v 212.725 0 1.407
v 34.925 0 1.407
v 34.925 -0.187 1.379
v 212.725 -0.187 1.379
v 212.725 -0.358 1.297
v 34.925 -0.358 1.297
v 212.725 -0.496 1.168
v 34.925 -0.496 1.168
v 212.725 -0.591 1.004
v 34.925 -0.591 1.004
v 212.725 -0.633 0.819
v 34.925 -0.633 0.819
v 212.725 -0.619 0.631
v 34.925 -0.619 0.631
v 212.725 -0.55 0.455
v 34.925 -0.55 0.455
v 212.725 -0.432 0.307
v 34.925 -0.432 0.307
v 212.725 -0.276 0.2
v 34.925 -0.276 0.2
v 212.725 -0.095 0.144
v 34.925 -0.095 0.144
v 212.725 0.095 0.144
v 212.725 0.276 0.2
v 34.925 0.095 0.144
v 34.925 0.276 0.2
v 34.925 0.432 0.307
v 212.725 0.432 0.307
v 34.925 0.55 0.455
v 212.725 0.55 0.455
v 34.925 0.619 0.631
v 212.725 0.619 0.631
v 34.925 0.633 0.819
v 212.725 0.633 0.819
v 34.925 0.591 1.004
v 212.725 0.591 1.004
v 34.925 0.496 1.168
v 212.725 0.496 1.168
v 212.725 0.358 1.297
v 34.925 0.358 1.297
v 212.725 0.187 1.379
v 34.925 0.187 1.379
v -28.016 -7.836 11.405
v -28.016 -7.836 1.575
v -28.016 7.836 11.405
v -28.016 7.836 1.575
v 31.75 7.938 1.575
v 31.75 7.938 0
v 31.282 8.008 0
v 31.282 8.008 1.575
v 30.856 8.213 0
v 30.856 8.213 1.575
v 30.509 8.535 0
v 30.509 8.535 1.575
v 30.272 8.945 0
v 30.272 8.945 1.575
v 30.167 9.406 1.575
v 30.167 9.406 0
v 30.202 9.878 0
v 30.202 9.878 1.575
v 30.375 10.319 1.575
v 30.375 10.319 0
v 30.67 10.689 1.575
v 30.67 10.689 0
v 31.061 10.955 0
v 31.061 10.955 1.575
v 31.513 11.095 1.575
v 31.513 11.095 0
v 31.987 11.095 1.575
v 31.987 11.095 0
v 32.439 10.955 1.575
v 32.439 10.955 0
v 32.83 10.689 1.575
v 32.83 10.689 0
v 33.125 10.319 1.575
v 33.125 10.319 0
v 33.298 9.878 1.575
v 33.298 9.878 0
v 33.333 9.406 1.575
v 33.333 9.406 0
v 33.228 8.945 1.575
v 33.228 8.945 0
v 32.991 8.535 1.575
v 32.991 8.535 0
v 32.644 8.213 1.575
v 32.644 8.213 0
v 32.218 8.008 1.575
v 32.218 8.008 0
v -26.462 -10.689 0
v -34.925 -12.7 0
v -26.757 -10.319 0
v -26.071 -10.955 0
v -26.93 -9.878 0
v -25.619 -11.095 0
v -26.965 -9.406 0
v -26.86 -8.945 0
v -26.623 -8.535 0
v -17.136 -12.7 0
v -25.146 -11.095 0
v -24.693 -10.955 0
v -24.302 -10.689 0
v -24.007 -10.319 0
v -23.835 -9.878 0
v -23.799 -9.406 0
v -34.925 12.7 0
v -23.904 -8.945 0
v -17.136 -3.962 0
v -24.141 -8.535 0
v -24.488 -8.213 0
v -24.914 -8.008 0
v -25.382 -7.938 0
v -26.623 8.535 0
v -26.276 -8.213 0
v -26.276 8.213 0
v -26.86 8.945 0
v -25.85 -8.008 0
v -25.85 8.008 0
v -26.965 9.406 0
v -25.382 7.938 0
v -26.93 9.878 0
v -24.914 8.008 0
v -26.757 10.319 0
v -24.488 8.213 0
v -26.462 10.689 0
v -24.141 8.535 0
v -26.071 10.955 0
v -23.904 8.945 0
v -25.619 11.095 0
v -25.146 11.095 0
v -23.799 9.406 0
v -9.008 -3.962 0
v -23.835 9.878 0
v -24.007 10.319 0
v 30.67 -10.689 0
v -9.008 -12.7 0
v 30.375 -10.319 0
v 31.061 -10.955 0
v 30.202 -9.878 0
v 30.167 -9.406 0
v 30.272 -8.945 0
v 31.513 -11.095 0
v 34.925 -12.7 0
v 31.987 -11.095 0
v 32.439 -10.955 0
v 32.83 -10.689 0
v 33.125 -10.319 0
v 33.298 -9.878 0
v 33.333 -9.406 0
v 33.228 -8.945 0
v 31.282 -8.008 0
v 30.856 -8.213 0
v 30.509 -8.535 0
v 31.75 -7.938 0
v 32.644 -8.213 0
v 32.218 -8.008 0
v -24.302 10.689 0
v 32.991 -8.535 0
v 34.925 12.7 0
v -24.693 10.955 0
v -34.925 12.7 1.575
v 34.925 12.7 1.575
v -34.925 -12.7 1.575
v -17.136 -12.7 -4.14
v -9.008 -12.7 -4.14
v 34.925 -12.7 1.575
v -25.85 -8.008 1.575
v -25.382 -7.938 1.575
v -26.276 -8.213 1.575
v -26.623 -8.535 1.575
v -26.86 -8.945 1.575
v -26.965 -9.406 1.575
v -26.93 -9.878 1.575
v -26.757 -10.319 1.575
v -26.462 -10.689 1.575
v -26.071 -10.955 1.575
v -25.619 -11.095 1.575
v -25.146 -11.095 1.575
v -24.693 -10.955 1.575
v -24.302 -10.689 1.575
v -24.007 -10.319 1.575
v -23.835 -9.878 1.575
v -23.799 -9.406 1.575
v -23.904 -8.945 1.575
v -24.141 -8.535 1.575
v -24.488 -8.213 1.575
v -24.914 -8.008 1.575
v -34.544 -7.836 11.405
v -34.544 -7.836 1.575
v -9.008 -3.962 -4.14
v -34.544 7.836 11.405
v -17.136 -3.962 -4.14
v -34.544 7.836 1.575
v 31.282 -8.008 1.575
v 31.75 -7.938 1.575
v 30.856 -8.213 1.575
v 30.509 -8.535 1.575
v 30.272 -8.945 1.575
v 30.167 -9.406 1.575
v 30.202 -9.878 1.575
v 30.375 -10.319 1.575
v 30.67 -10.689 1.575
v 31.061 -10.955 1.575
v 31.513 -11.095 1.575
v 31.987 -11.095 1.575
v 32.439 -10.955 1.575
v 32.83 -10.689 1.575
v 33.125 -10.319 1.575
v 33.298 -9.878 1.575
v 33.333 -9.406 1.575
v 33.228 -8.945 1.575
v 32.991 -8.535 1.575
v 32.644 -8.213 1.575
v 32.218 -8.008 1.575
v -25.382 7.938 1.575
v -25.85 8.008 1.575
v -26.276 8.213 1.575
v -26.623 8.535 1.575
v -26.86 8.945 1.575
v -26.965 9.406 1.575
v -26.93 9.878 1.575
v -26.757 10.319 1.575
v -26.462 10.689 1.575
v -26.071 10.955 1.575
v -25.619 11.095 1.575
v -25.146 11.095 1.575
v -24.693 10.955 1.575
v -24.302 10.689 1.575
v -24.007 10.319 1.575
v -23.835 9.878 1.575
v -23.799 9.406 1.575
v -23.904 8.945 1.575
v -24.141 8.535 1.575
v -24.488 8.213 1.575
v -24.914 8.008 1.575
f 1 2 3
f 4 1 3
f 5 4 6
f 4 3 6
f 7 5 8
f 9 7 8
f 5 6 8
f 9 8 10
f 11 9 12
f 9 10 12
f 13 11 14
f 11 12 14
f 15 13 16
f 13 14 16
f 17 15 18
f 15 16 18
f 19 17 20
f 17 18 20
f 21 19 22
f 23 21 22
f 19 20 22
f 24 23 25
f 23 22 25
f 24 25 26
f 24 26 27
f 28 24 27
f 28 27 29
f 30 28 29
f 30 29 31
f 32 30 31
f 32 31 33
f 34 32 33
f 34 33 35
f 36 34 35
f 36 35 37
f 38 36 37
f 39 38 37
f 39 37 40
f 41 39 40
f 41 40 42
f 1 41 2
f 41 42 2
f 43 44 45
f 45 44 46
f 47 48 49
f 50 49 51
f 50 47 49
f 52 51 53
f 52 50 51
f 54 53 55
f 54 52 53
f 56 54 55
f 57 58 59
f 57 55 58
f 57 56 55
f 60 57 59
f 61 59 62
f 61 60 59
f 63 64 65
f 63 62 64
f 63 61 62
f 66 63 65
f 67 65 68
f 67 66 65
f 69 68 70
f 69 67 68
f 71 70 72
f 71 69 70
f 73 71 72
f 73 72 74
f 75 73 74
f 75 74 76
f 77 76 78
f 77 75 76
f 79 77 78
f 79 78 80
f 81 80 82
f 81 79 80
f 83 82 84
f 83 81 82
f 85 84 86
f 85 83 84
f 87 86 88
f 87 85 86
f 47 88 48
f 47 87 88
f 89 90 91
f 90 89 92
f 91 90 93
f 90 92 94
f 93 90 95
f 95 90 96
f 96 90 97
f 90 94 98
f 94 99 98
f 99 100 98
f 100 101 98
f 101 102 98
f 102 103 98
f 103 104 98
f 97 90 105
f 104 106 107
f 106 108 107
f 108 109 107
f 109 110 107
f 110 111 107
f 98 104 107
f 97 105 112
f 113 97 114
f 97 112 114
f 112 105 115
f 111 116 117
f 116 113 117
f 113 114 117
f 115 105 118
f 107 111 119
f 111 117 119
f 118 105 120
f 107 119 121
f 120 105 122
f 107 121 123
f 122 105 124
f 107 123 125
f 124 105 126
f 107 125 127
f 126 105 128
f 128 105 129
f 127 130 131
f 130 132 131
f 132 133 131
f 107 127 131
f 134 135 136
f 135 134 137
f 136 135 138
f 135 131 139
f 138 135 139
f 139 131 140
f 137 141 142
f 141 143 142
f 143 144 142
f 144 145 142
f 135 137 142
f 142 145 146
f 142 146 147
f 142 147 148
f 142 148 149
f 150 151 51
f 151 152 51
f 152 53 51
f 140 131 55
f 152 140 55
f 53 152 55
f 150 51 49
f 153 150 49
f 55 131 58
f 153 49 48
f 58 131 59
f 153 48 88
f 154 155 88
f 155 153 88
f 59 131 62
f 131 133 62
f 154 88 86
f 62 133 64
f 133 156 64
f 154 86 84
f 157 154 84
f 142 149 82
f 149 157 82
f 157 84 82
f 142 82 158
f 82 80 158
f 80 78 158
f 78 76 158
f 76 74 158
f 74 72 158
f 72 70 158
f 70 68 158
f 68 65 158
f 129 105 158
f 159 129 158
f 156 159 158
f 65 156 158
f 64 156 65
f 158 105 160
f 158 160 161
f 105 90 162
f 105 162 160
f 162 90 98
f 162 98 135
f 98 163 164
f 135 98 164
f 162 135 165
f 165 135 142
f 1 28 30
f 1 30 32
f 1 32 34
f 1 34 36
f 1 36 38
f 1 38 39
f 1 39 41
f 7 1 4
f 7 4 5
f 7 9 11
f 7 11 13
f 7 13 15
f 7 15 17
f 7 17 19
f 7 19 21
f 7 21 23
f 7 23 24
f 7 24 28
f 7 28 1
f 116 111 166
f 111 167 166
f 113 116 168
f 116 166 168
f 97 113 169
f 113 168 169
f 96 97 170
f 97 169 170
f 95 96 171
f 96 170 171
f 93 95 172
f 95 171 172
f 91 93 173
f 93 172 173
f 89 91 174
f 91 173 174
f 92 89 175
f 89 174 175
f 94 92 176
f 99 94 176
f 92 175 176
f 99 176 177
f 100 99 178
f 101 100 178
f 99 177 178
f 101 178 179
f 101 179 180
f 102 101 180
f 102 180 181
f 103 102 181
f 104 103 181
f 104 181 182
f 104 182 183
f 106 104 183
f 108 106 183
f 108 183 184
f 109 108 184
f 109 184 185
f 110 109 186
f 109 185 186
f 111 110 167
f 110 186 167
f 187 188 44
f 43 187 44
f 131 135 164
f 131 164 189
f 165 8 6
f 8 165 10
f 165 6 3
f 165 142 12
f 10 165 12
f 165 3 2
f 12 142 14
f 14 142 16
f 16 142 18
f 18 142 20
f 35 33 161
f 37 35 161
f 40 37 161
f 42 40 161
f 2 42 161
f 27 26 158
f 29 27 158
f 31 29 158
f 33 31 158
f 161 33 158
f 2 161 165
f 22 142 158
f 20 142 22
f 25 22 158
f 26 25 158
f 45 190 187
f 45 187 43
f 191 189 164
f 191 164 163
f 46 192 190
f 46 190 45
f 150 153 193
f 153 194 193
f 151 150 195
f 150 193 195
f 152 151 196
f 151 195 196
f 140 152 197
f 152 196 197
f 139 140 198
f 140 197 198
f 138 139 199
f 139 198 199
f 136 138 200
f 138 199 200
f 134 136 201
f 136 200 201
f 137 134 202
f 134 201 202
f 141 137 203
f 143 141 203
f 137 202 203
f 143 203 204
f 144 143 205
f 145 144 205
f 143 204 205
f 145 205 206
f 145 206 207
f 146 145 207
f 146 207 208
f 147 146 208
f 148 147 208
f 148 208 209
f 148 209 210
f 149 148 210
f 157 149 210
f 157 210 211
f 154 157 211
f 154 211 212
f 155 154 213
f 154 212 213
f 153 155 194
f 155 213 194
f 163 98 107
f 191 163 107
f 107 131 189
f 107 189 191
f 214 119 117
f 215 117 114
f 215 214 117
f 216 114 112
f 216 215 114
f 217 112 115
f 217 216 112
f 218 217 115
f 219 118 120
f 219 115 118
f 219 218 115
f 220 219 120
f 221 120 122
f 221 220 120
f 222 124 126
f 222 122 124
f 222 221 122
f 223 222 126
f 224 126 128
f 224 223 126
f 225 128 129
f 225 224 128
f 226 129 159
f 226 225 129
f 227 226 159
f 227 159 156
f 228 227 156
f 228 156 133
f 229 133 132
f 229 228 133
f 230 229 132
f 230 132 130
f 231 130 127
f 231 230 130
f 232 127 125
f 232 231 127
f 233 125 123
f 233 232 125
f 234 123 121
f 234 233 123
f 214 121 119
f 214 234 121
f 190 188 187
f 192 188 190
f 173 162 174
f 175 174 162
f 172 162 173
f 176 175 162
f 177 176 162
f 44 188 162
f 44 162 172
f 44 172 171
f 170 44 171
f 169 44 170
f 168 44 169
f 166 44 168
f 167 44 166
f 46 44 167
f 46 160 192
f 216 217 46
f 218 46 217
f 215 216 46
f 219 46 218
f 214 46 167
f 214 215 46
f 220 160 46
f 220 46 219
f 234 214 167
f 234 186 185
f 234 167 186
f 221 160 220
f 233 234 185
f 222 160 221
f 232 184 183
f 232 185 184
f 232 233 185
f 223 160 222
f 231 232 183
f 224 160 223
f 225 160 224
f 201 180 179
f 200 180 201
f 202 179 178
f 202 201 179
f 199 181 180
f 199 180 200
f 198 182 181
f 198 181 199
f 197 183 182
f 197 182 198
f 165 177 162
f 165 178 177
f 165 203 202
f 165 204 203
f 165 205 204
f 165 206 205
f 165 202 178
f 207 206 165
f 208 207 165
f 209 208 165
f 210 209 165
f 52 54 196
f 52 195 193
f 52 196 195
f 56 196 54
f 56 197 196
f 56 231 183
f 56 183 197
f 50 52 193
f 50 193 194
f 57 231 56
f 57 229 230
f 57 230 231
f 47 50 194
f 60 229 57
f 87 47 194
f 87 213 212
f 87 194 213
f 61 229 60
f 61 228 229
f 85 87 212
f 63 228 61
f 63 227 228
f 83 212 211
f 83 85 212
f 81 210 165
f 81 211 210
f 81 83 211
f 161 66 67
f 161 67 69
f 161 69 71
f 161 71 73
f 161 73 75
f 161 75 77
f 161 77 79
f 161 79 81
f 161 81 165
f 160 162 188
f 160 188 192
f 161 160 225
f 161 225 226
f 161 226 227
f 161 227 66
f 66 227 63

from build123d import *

# Parameters (mm, degrees)
SKETCH1_W                             = 69.85
SKETCH1_H                             = 25.4
EXTRUDE1_DEPTH                        = 1.5748
F_1_8_0_125_DIAMETER_HOLE1_AT_2_COUNT = 2
F_1_8_0_125_DIAMETER_HOLE1_AT_2_PITCH = 57.13222
SKETCH4_R                             = 0.635
BOSS_EXTRUDE1_DEPTH                   = 177.8
SKETCH5_W                             = 8.128
SKETCH5_H                             = 8.7376
USB_CONNECTOR_DEPTH                   = 4.1402
SKETCH8_W                             = 6.5278
SKETCH8_H                             = 15.6718
BOSS_EXTRUDE3_DEPTH                   = 9.8298


with BuildPart() as part:
    # Sketch1 → Extrude1 (new body)
    with BuildSketch(Plane.XY):
        Rectangle(SKETCH1_W, SKETCH1_H)
    extrude(amount=EXTRUDE1_DEPTH)

    # Sketch3 → 1/8 (0.125) Diameter Hole1 (revolve, cut)
    with BuildSketch(Plane(origin=(-25.38222, 9.525, 1.5748), x_dir=(0, -1, 0), z_dir=(1, 0, 0))):
        Polygon((0, 0), (0, 16.955866233), (1.5875, 16.002), (1.5875, 0), align=None)
    f_1_8_0_125_diameter_hole1 = revolve(axis=Axis((-25.38222, 9.525, 7.9248), (0, 0, -1)), mode=Mode.SUBTRACT)

    # 1/8 (0.125) Diameter Hole1 at 2: 1/8 (0.125) Diameter Hole1 ×2
    with Locations(*[(i * F_1_8_0_125_DIAMETER_HOLE1_AT_2_PITCH, 0, 0) for i in range(1, F_1_8_0_125_DIAMETER_HOLE1_AT_2_COUNT)]):
        add(f_1_8_0_125_diameter_hole1, mode=Mode.SUBTRACT)

    # Mirror1: 1/8 (0.125) Diameter Hole1 across plane
    add(f_1_8_0_125_diameter_hole1.mirror(Plane.ZX), mode=Mode.SUBTRACT)

    # Mirror1 copy 1 sketch → Mirror1 copy 1 (revolve, cut)
    with BuildSketch(Plane(origin=(31.75, -9.525, 1.5748), x_dir=(0, 1, 0), z_dir=(1, 0, 0))):
        Polygon((0, 0), (0, -16.955866233), (1.5875, -16.002), (1.5875, 0), align=None)
    revolve(axis=Axis((31.75, -9.525, 7.9248), (0, 0, 1)), mode=Mode.SUBTRACT)

    # Sketch4 → Boss-Extrude1 (add)
    with BuildSketch(Plane(origin=(34.925, 0, 0), x_dir=(0, 0, -1), z_dir=(1, 0, 0))):
        with Locations(Location((-0.772028936, 0, 0), (0, 0, 180))):
            Circle(SKETCH4_R)
    extrude(amount=BOSS_EXTRUDE1_DEPTH)

    # Sketch5 → USB Connector (add)
    with BuildSketch(Plane(origin=(0, 0, 0), x_dir=(-1, 0, 0), z_dir=(0, 0, -1))):
        with Locations((13.072066229, -8.3312)):
            Rectangle(SKETCH5_W, SKETCH5_H)
    extrude(amount=USB_CONNECTOR_DEPTH)

    # Sketch8 → Boss-Extrude3 (add)
    with BuildSketch(Plane.XY.offset(1.5748)):
        with Locations((-31.2801, 0)):
            Rectangle(SKETCH8_W, SKETCH8_H)
    extrude(amount=BOSS_EXTRUDE3_DEPTH)


solid = part.part
